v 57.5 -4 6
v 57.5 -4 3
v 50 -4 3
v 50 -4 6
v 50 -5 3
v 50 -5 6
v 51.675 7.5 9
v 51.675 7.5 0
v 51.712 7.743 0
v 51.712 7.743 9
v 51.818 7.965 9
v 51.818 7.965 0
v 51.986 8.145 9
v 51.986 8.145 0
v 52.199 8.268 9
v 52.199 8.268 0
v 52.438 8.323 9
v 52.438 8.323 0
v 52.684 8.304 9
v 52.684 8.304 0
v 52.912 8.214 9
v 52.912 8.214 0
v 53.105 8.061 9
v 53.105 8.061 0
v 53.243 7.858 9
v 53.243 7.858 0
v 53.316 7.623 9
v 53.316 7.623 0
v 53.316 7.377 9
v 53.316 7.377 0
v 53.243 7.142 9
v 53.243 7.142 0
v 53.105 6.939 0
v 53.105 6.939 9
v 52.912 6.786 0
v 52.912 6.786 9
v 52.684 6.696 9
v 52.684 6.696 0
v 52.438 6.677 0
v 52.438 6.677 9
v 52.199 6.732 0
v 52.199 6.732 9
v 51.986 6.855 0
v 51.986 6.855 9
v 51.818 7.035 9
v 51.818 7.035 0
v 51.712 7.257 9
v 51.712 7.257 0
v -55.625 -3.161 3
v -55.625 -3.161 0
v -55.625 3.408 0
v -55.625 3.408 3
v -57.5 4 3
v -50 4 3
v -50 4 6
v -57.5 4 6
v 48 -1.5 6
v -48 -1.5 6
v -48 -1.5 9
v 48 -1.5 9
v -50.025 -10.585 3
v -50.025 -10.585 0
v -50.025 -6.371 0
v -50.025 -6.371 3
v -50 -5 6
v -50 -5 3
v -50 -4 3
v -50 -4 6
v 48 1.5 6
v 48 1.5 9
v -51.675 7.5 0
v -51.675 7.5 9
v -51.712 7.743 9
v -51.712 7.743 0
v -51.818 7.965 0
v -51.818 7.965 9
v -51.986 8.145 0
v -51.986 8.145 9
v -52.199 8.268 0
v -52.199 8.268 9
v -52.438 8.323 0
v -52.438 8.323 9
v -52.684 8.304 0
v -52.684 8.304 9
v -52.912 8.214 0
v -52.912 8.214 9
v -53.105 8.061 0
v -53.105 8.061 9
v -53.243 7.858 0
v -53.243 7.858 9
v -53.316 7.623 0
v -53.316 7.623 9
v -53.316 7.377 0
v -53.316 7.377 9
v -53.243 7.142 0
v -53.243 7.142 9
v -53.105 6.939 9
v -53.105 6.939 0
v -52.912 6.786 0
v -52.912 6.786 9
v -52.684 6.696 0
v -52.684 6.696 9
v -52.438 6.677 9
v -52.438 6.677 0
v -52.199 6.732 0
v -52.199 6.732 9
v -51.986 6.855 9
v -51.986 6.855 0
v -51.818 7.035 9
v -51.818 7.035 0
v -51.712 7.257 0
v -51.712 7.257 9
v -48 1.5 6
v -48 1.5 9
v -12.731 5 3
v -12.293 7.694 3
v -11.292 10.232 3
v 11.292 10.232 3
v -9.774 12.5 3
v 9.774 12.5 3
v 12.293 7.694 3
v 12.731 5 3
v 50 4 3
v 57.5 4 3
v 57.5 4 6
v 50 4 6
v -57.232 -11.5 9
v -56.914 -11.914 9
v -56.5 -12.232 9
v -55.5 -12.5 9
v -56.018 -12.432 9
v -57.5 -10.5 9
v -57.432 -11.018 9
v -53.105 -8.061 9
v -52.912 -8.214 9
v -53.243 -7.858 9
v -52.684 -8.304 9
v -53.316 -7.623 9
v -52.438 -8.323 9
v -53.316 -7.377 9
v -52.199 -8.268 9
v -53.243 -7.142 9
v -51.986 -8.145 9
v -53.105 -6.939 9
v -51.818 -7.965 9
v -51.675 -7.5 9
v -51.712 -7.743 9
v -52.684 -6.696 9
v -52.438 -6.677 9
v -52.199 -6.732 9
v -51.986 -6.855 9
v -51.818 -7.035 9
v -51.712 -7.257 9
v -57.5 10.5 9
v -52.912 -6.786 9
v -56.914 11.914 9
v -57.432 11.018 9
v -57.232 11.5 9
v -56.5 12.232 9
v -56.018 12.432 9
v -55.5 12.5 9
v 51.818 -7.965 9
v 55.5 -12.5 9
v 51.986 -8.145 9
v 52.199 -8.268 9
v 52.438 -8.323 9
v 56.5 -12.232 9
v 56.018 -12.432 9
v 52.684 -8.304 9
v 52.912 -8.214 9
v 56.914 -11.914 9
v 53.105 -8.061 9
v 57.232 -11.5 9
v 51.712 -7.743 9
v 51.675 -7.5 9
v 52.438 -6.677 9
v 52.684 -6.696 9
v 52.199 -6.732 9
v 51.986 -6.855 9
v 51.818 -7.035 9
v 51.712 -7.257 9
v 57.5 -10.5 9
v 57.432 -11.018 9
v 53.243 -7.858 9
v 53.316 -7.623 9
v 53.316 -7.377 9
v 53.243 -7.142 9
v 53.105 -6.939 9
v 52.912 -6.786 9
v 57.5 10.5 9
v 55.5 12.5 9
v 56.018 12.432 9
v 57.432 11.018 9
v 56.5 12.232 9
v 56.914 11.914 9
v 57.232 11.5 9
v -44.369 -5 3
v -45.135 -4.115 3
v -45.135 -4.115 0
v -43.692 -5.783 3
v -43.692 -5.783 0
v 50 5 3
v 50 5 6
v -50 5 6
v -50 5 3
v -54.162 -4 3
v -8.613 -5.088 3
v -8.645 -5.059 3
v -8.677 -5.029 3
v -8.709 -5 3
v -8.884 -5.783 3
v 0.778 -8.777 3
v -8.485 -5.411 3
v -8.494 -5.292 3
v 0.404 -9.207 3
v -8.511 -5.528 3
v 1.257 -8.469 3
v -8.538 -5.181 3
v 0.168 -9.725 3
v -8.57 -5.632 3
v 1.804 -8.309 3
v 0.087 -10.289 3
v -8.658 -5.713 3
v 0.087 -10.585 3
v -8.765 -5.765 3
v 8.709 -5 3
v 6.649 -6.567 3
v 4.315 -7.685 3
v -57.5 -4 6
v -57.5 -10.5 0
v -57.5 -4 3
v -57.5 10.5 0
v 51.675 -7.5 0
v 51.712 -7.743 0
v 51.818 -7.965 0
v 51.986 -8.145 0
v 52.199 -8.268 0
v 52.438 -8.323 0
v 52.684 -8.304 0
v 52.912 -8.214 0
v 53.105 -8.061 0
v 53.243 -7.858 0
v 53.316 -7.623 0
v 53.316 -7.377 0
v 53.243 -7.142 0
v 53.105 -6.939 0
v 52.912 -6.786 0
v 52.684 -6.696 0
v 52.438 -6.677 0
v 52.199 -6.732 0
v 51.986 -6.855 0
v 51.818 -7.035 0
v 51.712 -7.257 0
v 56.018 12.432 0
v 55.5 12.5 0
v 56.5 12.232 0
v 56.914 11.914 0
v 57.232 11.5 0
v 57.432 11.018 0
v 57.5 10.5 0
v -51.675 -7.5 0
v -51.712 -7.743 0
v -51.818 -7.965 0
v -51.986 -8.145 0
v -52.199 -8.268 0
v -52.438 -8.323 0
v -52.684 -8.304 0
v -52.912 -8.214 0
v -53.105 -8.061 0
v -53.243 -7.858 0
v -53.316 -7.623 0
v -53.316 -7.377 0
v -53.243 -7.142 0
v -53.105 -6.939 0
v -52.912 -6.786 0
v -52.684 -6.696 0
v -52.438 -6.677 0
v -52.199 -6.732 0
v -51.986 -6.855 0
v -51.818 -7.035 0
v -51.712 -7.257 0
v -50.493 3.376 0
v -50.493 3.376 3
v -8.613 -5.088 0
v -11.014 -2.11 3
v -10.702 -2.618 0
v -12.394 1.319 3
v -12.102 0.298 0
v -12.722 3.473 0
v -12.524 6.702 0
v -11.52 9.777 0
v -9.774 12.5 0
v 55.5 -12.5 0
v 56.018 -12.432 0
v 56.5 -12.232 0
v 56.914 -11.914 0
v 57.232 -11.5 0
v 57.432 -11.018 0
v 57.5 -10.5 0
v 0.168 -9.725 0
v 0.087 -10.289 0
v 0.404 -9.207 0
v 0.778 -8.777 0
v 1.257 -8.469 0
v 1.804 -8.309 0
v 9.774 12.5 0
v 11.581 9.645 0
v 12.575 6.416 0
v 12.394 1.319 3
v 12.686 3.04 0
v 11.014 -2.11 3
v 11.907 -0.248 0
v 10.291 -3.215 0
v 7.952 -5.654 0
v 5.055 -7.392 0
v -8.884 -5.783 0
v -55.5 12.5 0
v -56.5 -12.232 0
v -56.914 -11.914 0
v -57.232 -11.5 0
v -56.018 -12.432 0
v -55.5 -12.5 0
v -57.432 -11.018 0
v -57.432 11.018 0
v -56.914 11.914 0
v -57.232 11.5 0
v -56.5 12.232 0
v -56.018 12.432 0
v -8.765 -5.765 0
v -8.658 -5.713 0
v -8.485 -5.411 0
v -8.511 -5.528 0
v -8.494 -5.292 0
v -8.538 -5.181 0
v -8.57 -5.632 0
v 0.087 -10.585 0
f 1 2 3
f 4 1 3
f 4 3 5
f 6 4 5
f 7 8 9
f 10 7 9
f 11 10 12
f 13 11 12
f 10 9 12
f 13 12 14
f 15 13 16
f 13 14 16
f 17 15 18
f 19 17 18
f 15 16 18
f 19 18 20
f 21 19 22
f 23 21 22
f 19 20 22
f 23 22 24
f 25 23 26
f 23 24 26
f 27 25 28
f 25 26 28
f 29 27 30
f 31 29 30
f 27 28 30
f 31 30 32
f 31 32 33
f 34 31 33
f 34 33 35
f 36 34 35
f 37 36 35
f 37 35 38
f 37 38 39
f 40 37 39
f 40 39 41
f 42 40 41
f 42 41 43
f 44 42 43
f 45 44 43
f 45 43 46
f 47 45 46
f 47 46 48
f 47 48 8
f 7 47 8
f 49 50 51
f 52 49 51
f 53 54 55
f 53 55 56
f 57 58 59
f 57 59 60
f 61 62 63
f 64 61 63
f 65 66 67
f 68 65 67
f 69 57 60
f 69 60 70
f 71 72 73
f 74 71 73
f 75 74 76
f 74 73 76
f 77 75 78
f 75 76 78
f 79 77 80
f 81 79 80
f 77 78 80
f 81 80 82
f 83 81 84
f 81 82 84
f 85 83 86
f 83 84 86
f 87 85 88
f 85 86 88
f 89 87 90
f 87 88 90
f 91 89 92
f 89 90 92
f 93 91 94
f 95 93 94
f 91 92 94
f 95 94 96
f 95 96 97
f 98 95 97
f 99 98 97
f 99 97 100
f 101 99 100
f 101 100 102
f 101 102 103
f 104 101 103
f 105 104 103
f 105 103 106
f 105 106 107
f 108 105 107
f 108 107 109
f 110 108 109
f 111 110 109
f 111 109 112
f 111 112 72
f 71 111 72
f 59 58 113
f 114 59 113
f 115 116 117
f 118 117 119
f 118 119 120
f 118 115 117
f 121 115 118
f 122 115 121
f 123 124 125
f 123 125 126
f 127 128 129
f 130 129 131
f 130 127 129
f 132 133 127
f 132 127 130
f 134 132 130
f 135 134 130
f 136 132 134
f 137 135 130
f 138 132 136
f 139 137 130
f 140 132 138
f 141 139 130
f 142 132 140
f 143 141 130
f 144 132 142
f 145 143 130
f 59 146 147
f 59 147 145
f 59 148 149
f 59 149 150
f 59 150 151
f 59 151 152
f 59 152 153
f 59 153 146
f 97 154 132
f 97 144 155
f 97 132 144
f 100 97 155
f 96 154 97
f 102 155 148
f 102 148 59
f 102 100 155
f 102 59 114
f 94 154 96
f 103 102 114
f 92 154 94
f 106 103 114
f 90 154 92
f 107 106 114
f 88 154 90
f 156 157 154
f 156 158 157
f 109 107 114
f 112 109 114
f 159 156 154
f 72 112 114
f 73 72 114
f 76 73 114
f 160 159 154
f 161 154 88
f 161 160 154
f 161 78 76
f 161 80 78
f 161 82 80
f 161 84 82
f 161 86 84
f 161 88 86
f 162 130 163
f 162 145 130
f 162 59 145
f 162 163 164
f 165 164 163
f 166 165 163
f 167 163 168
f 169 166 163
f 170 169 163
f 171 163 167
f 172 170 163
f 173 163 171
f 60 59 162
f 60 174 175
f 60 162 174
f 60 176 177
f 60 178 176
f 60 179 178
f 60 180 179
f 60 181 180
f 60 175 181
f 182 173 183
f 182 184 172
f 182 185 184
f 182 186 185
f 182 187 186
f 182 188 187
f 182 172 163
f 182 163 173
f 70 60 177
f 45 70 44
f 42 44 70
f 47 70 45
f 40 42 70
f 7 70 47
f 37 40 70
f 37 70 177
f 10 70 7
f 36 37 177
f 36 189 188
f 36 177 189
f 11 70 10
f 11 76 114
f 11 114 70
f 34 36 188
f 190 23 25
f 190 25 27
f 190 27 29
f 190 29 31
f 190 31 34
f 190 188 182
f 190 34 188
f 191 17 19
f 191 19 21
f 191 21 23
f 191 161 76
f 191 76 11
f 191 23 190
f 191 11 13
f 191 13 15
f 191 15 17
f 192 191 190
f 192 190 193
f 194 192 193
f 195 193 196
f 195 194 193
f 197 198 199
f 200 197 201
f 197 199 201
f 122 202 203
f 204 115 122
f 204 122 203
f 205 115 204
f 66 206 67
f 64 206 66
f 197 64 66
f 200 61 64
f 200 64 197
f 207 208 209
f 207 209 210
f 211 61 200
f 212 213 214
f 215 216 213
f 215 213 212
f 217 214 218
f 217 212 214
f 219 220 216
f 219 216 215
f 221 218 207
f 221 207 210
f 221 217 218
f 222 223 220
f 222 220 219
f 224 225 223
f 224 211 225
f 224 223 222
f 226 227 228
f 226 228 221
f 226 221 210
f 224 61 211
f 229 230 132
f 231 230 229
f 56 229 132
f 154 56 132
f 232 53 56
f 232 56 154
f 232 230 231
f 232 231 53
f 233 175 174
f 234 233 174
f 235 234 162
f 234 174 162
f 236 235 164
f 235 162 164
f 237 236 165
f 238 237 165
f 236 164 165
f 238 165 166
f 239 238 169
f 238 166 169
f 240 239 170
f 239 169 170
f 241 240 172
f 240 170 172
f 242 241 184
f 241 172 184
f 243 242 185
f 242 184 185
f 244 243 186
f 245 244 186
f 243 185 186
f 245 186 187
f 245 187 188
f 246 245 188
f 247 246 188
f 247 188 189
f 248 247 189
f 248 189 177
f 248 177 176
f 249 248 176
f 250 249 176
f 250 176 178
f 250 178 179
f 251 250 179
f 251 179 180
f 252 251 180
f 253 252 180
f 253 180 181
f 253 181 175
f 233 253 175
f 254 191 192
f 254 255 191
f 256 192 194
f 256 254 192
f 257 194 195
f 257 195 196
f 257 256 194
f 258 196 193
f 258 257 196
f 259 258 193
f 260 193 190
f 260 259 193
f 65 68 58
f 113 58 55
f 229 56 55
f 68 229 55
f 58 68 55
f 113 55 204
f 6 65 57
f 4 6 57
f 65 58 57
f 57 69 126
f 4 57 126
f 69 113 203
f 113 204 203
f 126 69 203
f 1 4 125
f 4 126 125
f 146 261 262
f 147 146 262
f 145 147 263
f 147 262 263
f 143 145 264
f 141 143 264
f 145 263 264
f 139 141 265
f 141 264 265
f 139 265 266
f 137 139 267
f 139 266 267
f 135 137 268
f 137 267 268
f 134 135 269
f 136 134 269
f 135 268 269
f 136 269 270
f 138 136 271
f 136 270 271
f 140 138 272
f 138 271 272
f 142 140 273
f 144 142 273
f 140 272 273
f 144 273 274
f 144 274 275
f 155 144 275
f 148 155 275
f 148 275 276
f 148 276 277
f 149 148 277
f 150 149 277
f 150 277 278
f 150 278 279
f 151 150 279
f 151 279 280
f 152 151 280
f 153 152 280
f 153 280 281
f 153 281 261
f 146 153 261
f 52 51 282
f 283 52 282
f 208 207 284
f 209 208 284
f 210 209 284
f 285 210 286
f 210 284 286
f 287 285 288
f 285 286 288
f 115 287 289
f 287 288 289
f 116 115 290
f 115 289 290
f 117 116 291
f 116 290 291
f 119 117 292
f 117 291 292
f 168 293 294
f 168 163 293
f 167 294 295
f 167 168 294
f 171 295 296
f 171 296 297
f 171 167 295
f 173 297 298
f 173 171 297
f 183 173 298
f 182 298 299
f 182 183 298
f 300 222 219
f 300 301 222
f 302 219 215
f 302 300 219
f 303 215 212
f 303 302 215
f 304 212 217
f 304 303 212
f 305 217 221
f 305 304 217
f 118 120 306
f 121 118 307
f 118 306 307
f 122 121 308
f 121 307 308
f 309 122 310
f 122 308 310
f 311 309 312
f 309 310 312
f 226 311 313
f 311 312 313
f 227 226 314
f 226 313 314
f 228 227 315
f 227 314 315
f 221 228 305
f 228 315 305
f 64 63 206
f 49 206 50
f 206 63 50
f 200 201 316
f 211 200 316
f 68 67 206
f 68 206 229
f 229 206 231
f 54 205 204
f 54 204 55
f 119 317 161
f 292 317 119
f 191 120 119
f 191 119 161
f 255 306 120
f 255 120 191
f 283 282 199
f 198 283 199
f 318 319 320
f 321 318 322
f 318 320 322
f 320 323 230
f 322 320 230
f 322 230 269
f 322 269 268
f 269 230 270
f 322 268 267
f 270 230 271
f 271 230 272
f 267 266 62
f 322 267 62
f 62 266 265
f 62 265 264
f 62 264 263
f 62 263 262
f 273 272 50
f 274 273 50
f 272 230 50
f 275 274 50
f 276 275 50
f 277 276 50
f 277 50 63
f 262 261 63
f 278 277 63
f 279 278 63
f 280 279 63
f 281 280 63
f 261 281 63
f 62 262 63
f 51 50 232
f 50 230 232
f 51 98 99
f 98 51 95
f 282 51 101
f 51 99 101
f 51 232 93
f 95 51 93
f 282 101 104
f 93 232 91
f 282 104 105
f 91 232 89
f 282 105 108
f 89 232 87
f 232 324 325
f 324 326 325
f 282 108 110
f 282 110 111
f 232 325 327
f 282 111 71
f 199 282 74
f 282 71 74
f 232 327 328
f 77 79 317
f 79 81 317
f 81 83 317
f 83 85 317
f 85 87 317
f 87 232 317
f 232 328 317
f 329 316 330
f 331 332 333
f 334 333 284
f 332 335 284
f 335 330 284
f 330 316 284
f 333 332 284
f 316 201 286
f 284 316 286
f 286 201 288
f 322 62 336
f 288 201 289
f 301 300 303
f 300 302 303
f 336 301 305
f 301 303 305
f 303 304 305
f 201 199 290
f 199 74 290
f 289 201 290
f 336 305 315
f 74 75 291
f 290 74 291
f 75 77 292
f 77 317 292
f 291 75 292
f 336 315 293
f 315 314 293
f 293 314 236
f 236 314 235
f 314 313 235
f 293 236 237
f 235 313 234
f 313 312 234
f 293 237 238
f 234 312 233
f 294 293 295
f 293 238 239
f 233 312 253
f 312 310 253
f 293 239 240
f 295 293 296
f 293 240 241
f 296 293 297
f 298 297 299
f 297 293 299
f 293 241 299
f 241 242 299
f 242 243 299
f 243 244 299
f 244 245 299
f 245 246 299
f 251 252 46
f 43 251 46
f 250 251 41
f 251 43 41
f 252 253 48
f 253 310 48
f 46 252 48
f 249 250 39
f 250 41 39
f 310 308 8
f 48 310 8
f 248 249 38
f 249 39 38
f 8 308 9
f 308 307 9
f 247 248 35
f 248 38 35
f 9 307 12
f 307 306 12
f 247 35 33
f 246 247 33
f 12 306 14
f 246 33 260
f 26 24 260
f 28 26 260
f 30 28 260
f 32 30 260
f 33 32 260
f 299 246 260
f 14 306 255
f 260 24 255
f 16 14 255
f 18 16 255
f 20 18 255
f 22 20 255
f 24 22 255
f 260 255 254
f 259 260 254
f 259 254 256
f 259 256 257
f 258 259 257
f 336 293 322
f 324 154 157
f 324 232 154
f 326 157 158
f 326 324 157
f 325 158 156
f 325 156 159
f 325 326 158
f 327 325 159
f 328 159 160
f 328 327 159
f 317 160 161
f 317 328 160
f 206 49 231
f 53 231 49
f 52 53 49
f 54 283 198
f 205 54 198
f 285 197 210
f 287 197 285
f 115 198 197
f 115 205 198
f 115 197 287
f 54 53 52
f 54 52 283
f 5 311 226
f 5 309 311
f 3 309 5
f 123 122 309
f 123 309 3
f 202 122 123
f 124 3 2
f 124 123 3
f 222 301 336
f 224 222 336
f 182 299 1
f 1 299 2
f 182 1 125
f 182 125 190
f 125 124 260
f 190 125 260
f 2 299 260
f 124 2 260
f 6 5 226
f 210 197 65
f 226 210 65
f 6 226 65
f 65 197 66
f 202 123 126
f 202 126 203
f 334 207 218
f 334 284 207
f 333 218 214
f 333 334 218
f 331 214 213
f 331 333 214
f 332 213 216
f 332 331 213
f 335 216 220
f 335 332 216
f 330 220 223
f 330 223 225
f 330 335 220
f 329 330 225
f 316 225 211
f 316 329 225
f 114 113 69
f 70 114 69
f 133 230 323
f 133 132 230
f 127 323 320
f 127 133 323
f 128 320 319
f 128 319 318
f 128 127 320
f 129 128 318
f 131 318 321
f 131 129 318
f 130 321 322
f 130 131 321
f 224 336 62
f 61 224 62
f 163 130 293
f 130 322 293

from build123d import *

# Parameters (mm, degrees)
SKETCH_W              = 115
SKETCH_H              = 25
PAD_DEPTH             = 3
PAD001_DEPTH          = 3
SKETCH002_W           = 115
SKETCH002_H           = 25
SKETCH002_W_2         = 96
SKETCH002_H_2         = 3
PAD002_DEPTH          = 3
SKETCH003_R           = 0.825
POCKET_DEPTH          = 245.060315
POLARPATTERN_COUNT    = 2
POLARPATTERN001_COUNT = 2
POLARPATTERN002_COUNT = 2
FILLET_R              = 2
SKETCH004_R           = 12.75
POCKET001_DEPTH       = 3
POCKET002_DEPTH       = 3
FILLET001_R           = 0.4
FILLET002_R           = 2


with BuildPart() as part:
    # Sketch → Pad (new body)
    with BuildSketch(Plane.XY):
        Rectangle(SKETCH_W, SKETCH_H)
    extrude(amount=PAD_DEPTH)

    # Sketch001 (on Face6 of Pad) → Pad001 (join)
    with BuildSketch(Plane.XY.offset(3)):
        Polygon((-57.5, 12.5), (57.5, 12.5), (57.5, 4), (50, 4), (50, 5), (-50, 5), (-50, 4), (-57.5, 4), align=None)
        Polygon((-57.5, -12.5), (57.5, -12.5), (57.5, -4), (50, -4), (50, -5), (-50, -5), (-50, -4), (-57.5, -4), align=None)
    extrude(amount=PAD001_DEPTH)

    # Sketch002 (on Face12 of Pad001) → Pad002 (join)
    with BuildSketch(Plane.XY.offset(6)):
        Rectangle(SKETCH002_W, SKETCH002_H)
        Rectangle(SKETCH002_W_2, SKETCH002_H_2, mode=Mode.SUBTRACT)
    extrude(amount=PAD002_DEPTH)

    # Sketch003 (on Face26 of Pad002) → Pocket (cut, through all)
    with BuildSketch(Plane.XY.offset(9)):
        with Locations((-52.5, 7.5)):
            Circle(SKETCH003_R)
    pocket = extrude(amount=-POCKET_DEPTH, mode=Mode.SUBTRACT)

    # PolarPattern: Pocket ×2 about axis
    polarpattern_axis = Axis((0, 0, 0), (0, 1, 0))
    for i in range(1, POLARPATTERN_COUNT):
        add(pocket.rotate(polarpattern_axis, i * 360 / POLARPATTERN_COUNT), mode=Mode.SUBTRACT)

    # PolarPattern001: Pocket ×2 about axis
    polarpattern001_axis = Axis((0, 0, 0), (1, 0, 0))
    for i in range(1, POLARPATTERN001_COUNT):
        add(pocket.rotate(polarpattern001_axis, i * 360 / POLARPATTERN001_COUNT), mode=Mode.SUBTRACT)

    # PolarPattern002: Pocket ×2 about axis
    polarpattern002_axis = Axis((0, 0, 9), (0, 0, 1))
    for i in range(1, POLARPATTERN002_COUNT):
        add(pocket.rotate(polarpattern002_axis, i * 360 / POLARPATTERN002_COUNT), mode=Mode.SUBTRACT)

    # Fillet
    fillet_edges = [part.edges().sort_by_distance(p)[0] for p in [
        (57.5, 12.5, 7.5),
        (57.5, 12.5, 4.5),
        (57.5, 12.5, 1.5),
        (57.5, -12.5, 7.5),
        (-57.5, 12.5, 7.5),
        (-57.5, -12.5, 7.5),
    ]]
    fillet(fillet_edges, radius=FILLET_R)

    # Sketch004 (on Face2 of Fillet) → Pocket001 (cut)
    with BuildSketch(Plane(origin=(0, 0, 0), x_dir=(1, 0, 0), z_dir=(0, 0, -1))):
        with Locations((0, -4.31247)):
            Circle(SKETCH004_R)
    extrude(amount=-POCKET001_DEPTH, mode=Mode.SUBTRACT)

    # Sketch005 (on Face2 of Pocket001) → Pocket002 (cut)
    with BuildSketch(Plane(origin=(0, 0, 0), x_dir=(1, 0, 0), z_dir=(0, 0, -1))):
        Polygon((0.086598, 10.584693), (-50.025204, 10.584693), (-50.025204, 6.371434), (-55.624748, 3.161258), (-55.624748, -3.408425), (-50.493088, -3.376352), (-45.134857, 4.115264), (-43.691578, 5.783052), (0.086598, 5.783052), align=None)
    extrude(amount=-POCKET002_DEPTH, mode=Mode.SUBTRACT)

    # Fillet001
    fillet001_edges = [part.edges().sort_by_distance(p)[0] for p in [
        (-7.787357, -5.783052, 1.5),
    ]]
    fillet(fillet001_edges, radius=FILLET001_R)

    # Fillet002
    fillet002_edges = [part.edges().sort_by_distance(p)[0] for p in [
        (0.086598, -8.437236, 1.5),
    ]]
    fillet(fillet002_edges, radius=FILLET002_R)


solid = part.part
